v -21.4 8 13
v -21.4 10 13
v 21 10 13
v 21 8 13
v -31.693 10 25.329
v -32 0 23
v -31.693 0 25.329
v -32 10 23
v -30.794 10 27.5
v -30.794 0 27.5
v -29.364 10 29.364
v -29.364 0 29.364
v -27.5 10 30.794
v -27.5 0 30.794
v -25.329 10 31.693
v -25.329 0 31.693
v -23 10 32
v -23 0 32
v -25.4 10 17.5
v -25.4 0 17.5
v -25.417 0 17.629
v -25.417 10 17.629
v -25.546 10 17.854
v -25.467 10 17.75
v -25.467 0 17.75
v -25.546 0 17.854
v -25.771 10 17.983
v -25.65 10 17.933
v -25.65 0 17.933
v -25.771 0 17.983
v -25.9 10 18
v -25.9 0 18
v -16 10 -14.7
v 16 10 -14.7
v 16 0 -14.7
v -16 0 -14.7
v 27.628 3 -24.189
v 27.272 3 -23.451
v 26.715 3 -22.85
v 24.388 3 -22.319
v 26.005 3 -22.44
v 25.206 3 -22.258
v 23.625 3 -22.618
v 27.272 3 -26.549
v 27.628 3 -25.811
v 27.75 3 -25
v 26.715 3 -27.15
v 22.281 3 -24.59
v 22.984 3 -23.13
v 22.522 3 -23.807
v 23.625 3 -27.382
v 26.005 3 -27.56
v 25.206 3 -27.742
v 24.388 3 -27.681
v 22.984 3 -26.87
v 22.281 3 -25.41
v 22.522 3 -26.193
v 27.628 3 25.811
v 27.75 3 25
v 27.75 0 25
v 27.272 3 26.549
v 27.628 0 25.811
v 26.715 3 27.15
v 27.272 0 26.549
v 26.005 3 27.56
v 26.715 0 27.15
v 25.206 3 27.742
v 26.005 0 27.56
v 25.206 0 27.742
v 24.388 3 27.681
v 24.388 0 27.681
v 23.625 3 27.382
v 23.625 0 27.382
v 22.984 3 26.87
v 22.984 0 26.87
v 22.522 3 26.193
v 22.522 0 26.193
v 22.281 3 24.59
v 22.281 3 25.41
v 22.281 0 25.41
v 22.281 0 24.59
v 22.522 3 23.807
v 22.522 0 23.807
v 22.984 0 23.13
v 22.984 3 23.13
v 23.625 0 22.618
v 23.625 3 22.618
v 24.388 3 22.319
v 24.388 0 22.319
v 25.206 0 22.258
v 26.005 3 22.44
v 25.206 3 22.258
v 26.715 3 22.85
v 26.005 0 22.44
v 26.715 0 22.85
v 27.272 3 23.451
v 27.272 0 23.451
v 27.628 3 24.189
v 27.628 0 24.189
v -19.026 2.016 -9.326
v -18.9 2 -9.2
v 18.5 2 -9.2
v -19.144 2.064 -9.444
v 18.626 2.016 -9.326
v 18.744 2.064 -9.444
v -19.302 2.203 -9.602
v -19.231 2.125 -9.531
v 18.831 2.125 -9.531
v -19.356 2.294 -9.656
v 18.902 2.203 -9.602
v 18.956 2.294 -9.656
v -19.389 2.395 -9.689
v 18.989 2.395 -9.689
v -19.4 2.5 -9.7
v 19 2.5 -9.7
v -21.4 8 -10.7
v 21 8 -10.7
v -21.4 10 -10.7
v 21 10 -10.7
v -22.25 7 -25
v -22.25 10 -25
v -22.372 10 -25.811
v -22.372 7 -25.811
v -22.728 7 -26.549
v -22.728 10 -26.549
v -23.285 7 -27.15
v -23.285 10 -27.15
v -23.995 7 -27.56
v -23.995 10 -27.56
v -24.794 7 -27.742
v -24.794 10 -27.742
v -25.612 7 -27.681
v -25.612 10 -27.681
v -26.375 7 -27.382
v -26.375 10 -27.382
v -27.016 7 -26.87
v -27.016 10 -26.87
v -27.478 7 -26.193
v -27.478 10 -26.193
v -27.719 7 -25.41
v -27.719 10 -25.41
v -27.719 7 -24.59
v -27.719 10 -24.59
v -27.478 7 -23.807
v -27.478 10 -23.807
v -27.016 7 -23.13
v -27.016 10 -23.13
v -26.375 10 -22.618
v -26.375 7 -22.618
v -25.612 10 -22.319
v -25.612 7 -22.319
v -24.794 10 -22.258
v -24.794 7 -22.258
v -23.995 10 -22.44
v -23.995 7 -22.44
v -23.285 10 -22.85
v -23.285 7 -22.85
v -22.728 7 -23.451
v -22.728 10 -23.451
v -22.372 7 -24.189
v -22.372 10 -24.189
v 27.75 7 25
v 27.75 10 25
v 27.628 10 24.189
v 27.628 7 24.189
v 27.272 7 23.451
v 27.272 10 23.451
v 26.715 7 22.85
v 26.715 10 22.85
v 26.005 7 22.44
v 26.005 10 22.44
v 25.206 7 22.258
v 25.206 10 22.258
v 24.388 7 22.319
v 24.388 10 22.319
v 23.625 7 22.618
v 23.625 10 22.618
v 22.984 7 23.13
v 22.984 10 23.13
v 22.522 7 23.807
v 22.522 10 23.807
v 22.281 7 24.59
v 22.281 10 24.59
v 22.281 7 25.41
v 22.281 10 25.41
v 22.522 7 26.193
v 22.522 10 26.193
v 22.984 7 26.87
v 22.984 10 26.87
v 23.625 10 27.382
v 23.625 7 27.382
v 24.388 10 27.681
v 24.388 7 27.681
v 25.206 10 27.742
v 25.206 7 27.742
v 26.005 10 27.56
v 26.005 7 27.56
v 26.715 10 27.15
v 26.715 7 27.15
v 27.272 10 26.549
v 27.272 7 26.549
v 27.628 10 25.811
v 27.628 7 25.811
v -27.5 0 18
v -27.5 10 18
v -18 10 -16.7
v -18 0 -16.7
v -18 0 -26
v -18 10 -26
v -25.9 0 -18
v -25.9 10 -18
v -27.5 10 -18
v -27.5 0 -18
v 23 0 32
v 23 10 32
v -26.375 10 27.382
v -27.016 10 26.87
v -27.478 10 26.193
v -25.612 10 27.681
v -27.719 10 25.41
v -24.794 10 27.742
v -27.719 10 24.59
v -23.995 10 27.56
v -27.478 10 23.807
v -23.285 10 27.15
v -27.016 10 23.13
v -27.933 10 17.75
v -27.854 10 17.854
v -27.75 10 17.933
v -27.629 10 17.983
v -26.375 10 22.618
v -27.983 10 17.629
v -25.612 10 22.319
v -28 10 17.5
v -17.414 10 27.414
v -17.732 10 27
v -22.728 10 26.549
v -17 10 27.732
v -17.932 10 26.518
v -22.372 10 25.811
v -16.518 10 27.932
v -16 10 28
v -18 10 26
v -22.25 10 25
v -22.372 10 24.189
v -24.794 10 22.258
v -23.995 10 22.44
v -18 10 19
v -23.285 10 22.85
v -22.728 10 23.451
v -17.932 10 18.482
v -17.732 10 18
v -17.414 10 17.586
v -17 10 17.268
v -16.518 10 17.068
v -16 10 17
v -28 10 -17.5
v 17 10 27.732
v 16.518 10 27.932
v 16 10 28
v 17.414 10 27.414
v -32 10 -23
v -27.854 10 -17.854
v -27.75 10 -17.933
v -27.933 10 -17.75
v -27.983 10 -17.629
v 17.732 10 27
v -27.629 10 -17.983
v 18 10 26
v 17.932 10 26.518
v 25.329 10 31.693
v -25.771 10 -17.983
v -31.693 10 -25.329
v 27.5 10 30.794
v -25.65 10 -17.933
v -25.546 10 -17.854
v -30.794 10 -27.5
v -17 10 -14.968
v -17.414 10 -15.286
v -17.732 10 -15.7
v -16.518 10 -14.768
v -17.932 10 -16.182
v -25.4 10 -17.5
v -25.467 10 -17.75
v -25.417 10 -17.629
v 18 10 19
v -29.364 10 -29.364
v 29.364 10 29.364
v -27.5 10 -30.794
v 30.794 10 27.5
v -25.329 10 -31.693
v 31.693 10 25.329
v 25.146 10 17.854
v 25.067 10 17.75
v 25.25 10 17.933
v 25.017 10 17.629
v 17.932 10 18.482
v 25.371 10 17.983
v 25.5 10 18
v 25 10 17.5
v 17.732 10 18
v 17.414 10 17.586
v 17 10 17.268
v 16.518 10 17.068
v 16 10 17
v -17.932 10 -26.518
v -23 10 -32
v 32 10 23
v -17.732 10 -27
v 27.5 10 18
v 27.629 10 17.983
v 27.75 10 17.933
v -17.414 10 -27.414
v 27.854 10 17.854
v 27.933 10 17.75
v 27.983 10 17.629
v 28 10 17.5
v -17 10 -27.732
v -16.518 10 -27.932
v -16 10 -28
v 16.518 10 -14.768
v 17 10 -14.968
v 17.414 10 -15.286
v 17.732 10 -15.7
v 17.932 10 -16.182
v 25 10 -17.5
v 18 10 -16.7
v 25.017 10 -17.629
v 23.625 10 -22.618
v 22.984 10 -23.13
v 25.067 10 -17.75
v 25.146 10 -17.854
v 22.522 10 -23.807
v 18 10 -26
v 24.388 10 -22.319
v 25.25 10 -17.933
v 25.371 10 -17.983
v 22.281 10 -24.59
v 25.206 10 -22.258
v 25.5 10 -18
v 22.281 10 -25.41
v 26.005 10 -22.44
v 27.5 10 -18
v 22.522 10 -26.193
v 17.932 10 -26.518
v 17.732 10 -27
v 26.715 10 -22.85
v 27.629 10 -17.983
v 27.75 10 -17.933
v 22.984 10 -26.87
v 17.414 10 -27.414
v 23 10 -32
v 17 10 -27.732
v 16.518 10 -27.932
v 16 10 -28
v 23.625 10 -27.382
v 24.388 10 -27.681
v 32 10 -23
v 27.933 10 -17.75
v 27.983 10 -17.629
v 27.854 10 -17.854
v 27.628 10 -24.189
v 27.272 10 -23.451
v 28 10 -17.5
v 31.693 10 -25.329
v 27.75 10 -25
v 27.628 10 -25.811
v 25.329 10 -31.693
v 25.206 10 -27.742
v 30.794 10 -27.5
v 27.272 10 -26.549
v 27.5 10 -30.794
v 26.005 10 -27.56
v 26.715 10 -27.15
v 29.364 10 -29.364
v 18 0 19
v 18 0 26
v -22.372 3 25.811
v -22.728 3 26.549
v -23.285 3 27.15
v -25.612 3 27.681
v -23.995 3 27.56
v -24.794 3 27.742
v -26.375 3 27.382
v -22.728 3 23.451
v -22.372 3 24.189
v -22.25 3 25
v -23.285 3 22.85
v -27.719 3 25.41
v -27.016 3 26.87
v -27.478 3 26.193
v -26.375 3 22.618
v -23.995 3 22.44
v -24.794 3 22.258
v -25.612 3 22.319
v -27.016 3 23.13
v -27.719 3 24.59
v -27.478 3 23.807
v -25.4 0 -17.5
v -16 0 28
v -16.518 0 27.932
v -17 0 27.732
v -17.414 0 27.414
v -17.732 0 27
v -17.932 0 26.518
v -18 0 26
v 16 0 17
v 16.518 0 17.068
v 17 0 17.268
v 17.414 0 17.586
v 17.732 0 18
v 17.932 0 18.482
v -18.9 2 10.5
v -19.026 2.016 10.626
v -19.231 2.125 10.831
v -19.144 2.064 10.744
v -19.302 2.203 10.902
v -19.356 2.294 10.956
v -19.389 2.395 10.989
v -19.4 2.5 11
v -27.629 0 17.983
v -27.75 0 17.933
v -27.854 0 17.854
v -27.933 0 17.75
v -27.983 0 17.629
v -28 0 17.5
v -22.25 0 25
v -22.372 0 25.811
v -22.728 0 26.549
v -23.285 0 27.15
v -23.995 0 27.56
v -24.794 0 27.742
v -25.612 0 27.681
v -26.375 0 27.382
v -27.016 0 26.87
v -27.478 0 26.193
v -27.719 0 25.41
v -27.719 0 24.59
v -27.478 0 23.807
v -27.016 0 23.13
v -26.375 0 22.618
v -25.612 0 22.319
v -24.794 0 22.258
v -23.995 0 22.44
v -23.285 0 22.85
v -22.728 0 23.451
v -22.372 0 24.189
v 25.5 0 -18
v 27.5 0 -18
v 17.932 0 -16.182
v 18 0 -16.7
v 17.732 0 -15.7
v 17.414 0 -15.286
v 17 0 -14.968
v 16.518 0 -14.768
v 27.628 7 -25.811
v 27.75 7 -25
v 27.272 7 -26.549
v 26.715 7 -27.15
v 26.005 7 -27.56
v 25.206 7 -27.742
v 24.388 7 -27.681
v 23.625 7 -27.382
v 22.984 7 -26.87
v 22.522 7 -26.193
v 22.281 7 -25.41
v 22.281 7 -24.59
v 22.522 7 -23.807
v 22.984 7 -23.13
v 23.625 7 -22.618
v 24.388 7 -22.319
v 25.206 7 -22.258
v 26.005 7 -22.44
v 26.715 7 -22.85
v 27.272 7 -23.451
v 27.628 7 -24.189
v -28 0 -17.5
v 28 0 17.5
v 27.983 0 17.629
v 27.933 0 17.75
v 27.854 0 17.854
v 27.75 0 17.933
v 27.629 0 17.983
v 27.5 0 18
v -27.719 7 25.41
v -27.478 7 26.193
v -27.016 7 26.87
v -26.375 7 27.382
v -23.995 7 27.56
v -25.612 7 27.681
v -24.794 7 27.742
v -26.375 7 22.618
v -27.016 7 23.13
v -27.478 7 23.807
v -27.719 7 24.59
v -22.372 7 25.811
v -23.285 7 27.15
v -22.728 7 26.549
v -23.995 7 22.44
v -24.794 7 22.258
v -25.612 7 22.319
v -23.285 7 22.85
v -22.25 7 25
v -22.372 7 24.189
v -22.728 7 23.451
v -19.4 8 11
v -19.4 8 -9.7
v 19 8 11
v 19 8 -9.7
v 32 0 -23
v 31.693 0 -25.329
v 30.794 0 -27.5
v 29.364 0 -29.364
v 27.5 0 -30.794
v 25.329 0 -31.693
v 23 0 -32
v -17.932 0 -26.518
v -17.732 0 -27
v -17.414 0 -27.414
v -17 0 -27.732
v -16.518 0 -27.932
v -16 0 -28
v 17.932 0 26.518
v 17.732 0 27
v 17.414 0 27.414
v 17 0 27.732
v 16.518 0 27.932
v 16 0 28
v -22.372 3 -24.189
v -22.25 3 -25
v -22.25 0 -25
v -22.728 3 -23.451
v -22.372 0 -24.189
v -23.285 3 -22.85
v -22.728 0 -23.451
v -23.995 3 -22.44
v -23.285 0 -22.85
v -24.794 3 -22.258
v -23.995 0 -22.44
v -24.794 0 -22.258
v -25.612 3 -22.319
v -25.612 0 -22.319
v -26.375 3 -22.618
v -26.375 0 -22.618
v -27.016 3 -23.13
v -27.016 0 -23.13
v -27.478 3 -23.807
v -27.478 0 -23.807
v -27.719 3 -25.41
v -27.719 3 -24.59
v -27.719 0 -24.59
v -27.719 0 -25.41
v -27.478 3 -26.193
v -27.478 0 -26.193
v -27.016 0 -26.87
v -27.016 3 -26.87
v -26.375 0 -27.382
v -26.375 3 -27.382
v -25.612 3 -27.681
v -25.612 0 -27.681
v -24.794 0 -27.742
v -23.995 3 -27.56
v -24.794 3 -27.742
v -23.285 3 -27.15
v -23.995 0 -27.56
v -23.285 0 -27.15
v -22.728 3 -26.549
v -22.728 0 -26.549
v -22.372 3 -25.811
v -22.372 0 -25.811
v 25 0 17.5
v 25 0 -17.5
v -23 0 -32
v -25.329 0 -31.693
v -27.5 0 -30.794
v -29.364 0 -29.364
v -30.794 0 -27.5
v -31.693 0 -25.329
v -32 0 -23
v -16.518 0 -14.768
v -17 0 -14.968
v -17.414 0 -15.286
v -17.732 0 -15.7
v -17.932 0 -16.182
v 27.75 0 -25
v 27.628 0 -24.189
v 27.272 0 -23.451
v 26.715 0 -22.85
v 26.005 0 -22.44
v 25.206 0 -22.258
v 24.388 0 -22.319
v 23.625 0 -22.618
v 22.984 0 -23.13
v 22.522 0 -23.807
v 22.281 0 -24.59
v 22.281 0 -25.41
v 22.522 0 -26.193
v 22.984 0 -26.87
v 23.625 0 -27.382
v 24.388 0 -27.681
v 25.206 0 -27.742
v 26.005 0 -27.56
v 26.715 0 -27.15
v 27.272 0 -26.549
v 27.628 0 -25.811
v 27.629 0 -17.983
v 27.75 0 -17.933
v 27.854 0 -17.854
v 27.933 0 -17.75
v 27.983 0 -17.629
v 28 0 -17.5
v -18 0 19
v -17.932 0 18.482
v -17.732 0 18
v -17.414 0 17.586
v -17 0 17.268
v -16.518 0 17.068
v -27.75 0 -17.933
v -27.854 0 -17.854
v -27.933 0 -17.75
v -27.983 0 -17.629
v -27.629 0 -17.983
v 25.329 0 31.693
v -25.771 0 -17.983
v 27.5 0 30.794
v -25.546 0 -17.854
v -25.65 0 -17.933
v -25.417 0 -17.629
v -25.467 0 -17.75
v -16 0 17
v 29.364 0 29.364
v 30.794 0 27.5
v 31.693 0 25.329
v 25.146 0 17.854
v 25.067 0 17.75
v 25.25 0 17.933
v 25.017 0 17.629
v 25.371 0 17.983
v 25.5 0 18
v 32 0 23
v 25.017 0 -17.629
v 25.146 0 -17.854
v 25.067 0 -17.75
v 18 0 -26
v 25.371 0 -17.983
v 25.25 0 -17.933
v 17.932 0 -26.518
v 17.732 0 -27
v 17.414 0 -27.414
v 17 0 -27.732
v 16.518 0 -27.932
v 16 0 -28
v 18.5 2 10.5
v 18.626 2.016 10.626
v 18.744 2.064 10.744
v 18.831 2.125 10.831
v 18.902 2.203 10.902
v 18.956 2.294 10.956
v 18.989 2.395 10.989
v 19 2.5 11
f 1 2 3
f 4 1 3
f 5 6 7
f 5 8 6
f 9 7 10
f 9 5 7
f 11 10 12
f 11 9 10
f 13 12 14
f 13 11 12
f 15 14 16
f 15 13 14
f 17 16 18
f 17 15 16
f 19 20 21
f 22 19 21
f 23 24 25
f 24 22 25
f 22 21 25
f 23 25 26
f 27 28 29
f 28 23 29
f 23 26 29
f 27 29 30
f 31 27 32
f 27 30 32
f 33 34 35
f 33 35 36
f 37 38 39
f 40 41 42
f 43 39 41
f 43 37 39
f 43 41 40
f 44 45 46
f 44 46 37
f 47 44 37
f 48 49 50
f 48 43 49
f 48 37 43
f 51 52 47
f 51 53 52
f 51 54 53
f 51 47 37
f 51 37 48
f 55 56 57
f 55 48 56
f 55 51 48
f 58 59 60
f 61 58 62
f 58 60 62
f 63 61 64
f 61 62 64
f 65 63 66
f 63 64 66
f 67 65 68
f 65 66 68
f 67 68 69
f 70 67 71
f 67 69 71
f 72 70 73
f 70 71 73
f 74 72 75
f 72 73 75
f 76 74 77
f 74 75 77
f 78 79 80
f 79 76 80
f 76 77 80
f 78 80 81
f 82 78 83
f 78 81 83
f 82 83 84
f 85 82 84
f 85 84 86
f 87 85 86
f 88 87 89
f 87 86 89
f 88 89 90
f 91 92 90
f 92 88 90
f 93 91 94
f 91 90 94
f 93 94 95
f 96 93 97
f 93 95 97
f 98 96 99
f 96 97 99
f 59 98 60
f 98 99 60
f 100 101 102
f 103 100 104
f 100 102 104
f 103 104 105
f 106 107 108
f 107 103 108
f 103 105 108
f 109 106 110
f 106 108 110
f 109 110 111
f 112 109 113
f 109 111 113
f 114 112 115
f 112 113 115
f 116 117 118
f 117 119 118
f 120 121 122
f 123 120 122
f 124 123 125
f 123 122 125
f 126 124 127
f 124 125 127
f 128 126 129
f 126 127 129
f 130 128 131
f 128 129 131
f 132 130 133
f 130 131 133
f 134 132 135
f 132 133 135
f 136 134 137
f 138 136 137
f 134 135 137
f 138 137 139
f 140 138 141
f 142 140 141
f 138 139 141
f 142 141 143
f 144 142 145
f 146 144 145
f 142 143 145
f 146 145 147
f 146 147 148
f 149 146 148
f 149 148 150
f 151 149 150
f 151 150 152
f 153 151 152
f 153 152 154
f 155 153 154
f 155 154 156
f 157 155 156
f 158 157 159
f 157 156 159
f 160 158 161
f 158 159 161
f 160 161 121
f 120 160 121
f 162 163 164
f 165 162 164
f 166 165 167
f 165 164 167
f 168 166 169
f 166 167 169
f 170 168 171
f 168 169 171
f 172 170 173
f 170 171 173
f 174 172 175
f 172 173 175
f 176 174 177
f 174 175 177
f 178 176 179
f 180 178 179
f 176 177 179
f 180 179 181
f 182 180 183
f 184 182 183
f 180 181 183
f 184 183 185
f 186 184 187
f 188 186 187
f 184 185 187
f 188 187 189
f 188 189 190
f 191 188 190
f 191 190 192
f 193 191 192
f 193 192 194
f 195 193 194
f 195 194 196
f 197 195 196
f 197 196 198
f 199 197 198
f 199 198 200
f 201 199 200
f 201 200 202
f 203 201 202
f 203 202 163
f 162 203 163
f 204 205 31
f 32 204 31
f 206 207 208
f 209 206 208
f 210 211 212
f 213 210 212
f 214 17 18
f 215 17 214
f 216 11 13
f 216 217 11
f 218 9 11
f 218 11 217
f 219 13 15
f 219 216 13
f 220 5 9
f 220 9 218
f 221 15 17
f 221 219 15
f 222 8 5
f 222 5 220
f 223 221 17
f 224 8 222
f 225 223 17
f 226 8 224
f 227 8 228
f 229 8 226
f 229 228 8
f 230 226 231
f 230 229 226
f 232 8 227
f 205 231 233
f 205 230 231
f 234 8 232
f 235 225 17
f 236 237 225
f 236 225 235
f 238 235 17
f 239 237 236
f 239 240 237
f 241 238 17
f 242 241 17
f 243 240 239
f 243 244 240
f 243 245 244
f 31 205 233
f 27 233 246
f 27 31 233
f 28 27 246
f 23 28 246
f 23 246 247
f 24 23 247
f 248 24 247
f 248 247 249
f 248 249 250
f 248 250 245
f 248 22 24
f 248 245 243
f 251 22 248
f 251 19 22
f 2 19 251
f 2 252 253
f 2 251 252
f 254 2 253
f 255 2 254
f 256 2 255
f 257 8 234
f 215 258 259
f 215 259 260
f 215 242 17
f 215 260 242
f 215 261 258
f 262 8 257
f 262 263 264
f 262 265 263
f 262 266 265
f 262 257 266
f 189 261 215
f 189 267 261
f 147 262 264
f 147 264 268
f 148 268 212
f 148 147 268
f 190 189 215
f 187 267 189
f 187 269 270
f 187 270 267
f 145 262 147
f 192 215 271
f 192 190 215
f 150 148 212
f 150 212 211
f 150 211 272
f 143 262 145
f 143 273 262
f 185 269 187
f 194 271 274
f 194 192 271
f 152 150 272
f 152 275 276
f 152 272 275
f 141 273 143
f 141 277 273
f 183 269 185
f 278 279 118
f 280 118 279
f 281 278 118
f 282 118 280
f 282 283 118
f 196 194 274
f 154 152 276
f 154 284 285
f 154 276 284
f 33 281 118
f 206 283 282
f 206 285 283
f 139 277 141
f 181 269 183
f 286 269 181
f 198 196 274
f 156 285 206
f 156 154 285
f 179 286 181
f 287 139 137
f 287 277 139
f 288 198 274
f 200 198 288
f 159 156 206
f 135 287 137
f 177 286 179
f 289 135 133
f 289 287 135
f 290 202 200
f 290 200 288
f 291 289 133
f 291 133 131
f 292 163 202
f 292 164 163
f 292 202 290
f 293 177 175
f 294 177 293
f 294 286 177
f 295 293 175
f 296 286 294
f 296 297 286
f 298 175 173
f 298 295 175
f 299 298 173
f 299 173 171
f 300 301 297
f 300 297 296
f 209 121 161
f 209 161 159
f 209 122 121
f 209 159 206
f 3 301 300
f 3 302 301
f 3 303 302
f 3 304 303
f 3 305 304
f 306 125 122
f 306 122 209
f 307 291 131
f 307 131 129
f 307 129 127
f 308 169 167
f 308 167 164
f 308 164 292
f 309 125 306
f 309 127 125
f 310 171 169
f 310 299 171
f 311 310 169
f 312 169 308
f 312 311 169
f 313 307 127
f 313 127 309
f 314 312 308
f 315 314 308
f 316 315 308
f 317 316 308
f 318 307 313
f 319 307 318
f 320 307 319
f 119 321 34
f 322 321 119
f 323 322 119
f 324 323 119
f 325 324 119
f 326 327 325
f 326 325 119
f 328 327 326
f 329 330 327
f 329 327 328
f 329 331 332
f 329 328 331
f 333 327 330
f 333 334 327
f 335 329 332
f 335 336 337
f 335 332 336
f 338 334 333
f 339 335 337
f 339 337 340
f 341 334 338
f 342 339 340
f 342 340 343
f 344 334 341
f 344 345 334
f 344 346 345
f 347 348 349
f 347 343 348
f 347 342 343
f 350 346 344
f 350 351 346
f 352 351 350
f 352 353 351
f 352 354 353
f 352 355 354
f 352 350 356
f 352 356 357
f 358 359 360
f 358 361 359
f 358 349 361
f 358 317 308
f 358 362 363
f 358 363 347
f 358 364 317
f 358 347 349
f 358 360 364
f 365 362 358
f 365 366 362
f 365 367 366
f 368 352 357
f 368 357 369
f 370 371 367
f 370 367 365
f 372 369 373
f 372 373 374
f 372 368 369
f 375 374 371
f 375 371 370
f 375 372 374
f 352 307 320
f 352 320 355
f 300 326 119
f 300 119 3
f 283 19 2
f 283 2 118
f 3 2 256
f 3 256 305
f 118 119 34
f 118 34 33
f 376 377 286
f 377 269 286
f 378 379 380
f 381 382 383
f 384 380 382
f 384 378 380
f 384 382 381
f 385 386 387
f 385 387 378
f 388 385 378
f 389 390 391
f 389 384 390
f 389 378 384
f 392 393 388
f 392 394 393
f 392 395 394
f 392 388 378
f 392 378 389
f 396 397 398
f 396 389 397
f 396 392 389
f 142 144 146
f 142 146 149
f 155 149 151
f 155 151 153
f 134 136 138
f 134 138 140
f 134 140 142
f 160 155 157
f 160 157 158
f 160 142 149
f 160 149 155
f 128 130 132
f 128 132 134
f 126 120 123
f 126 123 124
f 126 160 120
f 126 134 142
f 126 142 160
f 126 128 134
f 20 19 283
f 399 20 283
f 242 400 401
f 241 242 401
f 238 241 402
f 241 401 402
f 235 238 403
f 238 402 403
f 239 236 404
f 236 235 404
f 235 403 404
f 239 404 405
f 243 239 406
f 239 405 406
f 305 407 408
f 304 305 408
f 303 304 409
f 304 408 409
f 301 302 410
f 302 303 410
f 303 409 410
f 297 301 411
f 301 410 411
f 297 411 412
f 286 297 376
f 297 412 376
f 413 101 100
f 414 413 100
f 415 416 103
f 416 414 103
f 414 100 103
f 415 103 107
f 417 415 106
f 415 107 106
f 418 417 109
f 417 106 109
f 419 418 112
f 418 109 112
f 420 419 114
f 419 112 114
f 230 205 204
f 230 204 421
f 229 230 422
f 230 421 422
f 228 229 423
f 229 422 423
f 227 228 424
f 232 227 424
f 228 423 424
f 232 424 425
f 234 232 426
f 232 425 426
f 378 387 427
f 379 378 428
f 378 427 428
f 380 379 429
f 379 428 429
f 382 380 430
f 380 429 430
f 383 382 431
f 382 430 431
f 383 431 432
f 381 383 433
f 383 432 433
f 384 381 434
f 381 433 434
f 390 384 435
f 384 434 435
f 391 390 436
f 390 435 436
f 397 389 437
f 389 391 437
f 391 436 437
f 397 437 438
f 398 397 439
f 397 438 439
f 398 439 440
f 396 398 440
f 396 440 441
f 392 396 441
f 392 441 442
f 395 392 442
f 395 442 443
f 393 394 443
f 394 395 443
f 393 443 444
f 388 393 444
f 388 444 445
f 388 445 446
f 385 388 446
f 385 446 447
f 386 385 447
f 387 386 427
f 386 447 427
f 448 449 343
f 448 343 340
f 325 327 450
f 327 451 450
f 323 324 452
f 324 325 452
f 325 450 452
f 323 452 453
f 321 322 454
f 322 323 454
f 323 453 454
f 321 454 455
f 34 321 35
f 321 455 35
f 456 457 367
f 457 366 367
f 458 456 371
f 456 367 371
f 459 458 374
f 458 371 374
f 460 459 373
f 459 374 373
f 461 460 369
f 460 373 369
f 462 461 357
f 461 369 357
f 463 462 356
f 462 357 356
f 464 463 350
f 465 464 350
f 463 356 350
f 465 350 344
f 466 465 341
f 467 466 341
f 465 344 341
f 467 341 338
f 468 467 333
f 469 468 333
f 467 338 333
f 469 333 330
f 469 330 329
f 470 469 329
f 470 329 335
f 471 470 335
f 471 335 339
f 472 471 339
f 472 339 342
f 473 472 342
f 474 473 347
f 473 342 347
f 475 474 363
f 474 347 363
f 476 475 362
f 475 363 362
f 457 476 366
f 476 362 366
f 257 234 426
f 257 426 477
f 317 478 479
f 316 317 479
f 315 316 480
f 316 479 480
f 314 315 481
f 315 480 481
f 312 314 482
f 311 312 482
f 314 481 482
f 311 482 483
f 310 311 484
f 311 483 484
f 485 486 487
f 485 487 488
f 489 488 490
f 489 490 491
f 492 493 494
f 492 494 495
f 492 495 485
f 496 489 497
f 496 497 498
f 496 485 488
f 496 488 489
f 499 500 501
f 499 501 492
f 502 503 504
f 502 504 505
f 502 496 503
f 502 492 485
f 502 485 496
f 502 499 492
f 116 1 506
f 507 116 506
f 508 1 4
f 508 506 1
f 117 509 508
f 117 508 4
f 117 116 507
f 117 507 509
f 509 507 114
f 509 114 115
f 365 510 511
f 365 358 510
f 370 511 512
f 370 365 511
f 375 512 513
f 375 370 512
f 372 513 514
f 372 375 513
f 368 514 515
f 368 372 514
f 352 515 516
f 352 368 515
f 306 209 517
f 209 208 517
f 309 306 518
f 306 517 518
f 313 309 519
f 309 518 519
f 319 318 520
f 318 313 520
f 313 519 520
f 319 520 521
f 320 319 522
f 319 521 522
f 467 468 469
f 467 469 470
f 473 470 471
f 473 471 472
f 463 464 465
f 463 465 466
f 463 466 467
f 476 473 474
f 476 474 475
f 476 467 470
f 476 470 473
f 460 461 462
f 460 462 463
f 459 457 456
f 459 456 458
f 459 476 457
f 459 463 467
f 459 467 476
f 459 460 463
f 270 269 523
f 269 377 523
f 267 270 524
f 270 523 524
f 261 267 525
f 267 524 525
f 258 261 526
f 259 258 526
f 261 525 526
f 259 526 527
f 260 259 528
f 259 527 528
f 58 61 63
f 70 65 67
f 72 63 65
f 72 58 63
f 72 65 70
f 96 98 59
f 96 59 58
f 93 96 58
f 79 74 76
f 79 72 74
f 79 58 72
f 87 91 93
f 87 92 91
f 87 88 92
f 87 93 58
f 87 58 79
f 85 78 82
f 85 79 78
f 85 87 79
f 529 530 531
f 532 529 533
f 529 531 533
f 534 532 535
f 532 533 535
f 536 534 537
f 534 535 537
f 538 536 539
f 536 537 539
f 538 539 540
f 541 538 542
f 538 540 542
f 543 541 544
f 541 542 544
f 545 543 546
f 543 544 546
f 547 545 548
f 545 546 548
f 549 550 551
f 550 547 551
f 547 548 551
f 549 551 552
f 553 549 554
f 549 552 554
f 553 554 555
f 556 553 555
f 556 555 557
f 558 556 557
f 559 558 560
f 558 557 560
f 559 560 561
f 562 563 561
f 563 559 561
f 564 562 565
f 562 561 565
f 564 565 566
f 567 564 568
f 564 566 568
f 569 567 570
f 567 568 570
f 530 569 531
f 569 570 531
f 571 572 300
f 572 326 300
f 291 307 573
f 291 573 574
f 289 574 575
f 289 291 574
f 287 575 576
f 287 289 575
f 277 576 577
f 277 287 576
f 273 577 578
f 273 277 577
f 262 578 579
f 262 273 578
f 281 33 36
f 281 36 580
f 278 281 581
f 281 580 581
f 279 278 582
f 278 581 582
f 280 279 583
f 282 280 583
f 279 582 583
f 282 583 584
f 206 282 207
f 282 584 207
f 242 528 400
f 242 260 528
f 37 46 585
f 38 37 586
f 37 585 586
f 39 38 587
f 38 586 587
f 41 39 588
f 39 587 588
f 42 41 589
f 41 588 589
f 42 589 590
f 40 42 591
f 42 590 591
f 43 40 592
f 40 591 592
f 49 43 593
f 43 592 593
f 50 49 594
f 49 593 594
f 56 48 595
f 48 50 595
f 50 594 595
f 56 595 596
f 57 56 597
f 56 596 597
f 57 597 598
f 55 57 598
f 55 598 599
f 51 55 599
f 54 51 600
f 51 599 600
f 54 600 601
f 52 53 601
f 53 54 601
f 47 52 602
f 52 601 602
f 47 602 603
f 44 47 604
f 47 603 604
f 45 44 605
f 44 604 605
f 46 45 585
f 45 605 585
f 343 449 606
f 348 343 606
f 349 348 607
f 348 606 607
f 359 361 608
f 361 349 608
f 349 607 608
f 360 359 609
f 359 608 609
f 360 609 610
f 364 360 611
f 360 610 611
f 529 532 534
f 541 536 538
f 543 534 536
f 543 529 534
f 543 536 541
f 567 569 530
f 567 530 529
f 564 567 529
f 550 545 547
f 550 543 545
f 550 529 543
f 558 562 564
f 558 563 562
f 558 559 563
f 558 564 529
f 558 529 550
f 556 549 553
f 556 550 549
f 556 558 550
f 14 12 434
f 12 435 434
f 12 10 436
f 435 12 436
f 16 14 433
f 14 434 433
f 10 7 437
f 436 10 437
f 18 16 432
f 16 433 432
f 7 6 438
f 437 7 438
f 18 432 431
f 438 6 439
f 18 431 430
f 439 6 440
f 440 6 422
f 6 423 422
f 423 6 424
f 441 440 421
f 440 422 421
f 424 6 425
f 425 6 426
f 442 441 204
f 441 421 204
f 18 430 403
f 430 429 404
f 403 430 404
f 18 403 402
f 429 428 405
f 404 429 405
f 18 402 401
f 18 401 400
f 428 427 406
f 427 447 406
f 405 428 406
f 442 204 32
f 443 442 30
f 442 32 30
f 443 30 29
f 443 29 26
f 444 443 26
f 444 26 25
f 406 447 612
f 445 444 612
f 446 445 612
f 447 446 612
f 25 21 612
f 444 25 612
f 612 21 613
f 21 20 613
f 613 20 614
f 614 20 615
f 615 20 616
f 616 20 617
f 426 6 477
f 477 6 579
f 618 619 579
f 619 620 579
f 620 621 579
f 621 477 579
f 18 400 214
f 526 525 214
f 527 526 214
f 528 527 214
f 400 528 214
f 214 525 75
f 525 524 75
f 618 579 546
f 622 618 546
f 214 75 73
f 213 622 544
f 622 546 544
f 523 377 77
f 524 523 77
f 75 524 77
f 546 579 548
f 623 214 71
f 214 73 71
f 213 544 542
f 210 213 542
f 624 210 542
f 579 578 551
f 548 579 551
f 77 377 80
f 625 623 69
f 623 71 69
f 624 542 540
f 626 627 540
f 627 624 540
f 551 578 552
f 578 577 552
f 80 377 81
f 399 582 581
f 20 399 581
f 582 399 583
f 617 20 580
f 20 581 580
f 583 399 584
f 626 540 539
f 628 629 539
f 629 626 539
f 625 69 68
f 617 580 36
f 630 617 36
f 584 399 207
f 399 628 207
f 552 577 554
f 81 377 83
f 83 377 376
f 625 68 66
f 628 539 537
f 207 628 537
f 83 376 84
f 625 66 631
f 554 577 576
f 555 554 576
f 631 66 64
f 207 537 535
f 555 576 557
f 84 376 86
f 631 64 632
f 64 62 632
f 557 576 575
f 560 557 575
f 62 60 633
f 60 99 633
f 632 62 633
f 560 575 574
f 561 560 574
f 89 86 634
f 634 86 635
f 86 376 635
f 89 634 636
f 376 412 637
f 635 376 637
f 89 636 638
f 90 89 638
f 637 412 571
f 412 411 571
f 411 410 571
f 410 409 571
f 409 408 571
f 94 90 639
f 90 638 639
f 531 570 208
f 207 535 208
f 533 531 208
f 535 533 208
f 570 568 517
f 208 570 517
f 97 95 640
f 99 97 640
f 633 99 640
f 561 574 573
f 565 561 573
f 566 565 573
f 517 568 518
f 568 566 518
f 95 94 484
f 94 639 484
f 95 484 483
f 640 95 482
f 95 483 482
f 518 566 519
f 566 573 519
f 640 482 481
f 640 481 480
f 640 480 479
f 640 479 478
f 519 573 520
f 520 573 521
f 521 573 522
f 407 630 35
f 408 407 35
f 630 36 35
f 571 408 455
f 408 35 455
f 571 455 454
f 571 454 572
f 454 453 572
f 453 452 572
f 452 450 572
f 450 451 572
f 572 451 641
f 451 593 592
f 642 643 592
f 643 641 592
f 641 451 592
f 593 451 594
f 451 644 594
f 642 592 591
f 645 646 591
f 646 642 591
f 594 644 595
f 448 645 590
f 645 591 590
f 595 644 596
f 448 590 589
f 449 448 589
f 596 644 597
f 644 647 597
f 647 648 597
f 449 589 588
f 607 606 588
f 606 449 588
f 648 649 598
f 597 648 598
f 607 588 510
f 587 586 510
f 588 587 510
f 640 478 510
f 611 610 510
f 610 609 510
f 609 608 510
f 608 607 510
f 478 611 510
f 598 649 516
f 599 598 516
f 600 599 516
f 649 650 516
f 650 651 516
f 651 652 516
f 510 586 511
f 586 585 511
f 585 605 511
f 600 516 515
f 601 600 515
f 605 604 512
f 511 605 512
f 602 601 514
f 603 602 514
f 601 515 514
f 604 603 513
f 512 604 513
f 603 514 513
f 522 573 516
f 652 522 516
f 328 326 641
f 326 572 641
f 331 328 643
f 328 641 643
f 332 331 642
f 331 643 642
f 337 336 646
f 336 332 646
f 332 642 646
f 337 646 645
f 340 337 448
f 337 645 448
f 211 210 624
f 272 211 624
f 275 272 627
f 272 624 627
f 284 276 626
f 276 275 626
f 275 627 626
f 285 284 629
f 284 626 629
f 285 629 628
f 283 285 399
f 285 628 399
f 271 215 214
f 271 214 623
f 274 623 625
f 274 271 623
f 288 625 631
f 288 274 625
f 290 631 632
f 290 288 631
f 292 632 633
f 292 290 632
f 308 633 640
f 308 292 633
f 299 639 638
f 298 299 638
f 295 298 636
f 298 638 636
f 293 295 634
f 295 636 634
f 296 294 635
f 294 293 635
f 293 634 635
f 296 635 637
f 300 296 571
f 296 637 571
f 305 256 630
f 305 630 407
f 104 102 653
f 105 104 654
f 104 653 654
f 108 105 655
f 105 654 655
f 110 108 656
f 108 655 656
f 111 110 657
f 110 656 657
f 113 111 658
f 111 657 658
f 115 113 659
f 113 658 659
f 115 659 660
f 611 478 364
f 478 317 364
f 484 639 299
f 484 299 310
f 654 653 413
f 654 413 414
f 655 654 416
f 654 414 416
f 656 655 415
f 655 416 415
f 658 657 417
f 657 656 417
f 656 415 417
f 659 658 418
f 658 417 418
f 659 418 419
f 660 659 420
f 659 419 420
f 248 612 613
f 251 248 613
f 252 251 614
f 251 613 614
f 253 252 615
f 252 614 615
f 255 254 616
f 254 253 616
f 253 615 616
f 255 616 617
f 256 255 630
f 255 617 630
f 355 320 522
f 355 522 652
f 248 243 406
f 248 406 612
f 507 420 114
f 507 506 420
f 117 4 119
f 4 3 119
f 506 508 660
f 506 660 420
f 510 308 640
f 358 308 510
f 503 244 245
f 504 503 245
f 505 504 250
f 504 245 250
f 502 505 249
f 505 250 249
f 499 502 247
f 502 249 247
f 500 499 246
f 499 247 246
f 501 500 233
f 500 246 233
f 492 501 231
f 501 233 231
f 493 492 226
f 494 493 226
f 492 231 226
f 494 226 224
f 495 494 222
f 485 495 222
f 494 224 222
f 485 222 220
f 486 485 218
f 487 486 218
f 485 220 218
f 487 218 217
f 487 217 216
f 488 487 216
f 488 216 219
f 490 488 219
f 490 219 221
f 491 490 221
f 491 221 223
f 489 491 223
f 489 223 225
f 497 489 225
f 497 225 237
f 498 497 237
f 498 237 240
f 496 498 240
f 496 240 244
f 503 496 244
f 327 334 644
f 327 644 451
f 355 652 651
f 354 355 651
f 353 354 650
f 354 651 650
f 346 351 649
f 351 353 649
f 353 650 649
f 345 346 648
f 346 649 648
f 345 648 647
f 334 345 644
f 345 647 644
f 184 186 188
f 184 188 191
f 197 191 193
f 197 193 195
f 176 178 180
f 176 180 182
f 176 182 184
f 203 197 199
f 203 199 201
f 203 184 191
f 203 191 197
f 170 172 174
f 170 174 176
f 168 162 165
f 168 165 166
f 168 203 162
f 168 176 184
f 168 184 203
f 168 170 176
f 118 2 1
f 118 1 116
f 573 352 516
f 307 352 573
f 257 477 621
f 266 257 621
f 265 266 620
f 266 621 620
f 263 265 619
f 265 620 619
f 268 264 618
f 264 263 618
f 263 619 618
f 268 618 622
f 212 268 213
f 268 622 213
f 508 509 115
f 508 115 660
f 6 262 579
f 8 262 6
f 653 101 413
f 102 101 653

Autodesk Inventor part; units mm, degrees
ref_plane "YZ Plane" through (0, 0, 0) normal (1, 0, 0) x (0, 1, 0)
ref_plane "XZ Plane" through (0, 0, 0) normal (0, 1, 0) x (-1, 0, 0)
sketch "Sketch1" plane through (0, 0, 0) normal (0, 1, 0) x (-1, 0, 0)
  line L0 (30, 30) -> (-30, 30)
  line L1 (-30, 30) -> (-30, -30)
  line L2 (-30, -30) -> (30, -30)
  line L3 (30, -30) -> (30, 30)
  line L4 (30, 30) -> (-30, -30) construction
  line L5 (-30, 30) -> (30, -30) construction
  point P0 (0, 0)
  dimension "d0" = 60
  dimension "d1" = 60
extrude "Extrusion1" add sketch "Sketch1" along normal blind 10
fillet "Fillet1" radius 7 4 edges at (30, 5, 30) (30, 5, -30) (-30, 5, 30) (-30, 5, -30)
sketch "Sketch2" plane through (0, 10, 0) normal (0, 1, 0) x (1, 0, 0)
  line L0 (-30, 30) -> (30, 30)
  line L1 (30, 30) -> (30, -30)
  line L2 (30, -30) -> (-30, -30)
  line L3 (-30, -30) -> (-30, 30)
  line L4 (-30, 30) -> (30, -30) construction
  line L5 (30, 30) -> (-30, -30) construction
  line L6 (25, -25) -> (25, 25)
  line L7 (25, 25) -> (-25, 25)
  line L8 (-25, 25) -> (-25, -25)
  line L9 (-25, -25) -> (25, -25)
  circle A0 centre (25, -25) radius 2.75
  circle A1 centre (-25, -25) radius 2.75
  circle A2 centre (25, 25) radius 2.75
  circle A3 centre (-25, 25) radius 2.75
  point P0 (0, 0)
  dimension "d5" = 5
  dimension "d6" = 5.5
  dimension "d7" = 5.5
  dimension "d8" = 5.5
  dimension "d9" = 5.5
extrude "Extrusion2" cut sketch "Sketch2" against normal blind 3 contours L9 A0 L6 | L6 A0 L9 | A2 L7 L6 | L6 L7 A2 | A1 L8 L9 | L9 L8 A1 | A3 L8 L7 | L7 L8 A3
sketch "Sketch7" plane through (0, 10, 0) normal (0, 1, 0) x (1, 0, 0)
  line L0 (-23, 30) -> (23, 30)
  line L1 (30, 23) -> (30, -23)
  line L2 (23, -30) -> (-23, -30)
  line L3 (-30, -23) -> (-30, 23)
  line L4 (-30, 30) -> (30, -30) construction
  line L5 (30, 30) -> (-30, -30) construction
  arc A0 (-23, 30) -> (-30, 23) centre (-23, 23) ccw
  arc A1 (-30, -23) -> (-23, -30) centre (-23, -23) ccw
  arc A2 (23, -30) -> (30, -23) centre (23, -23) ccw
  arc A3 (30, 23) -> (23, 30) centre (23, 23) ccw
  line L6 (23, 32) -> (-23, 32)
  arc A4 (-23, 32) -> (-32, 23) centre (-23, 23) ccw
  line L7 (-32, 23) -> (-32, -23)
  arc A5 (-32, -23) -> (-23, -32) centre (-23, -23) ccw
  line L8 (-23, -32) -> (23, -32)
  arc A6 (23, -32) -> (32, -23) centre (23, -23) ccw
  line L9 (32, -23) -> (32, 23)
  arc A7 (32, 23) -> (23, 32) centre (23, 23) ccw
  point P0 (0, 0)
  dimension "d47" = 7
  dimension "d48" = 2
extrude "Extrusion6" add sketch "Sketch7" against normal blind 10
sketch "Sketch17" plane through (0, 10, 0) normal (0, 1, 0) x (1, 0, 0)
  circle A0 centre (25, -25) radius 2.75 projected
  line L0 (-25, 25) -> (25, 25)
  line L1 (25, 25) -> (25, -25)
  line L2 (25, -25) -> (-25, -25)
  line L3 (-25, -25) -> (-25, 25)
  line L4 (-25, 25) -> (25, -25) construction
  line L5 (25, 25) -> (-25, -25) construction
  line L6 (21, -21) -> (21, 10.7)
  line L7 (-21.4, -13) -> (21, -13)
  line L8 (21, 10.7) -> (-21.4, 10.7)
  line L9 (-21.4, -13) -> (-21.4, 10.7)
  line L10 (-19.4, 9.7) -> (-19.4, -11)
  line L11 (-19.4, -11) -> (19, -11)
  line L12 (19, 9.7) -> (-19.4, 9.7)
  line L13 (19, 9.7) -> (19, -11)
  point P0 (0, 0)
  dimension "d134" = 50
  dimension "d135" = 50
  dimension "d136" = 4
  dimension "d137" = 8
  dimension "d138" = 42.4
  dimension "d139" = 23.7
  dimension "d141" = 1
  dimension "d142" = 2
extrude "Extrusion15" cut sketch "Sketch17" against normal blind 2 contours L7 L9 L8 L6
sketch "Sketch18" plane through (0, 10, 0) normal (0, 1, 0) x (1, 0, 0)
  line L0 (-19.4, 9.7) -> (19, 9.7)
  line L1 (19, 9.7) -> (19, -11)
  line L2 (19, -11) -> (-19.4, -11)
  line L3 (-19.4, -11) -> (-19.4, 9.7)
  point P0 (0, 0)
extrude "Extrusion16" cut sketch "Sketch18" against normal blind 8
sketch "Sketch19" plane through (0, 10, 0) normal (0, 1, 0) x (1, 0, 0)
  line L0 (23, 32) -> (-23, 32) projected
  line L1 (-32, 23) -> (-32, -23) projected
  line L2 (32, -23) -> (32, 23) projected
  line L3 (-21.4, 10.7) -> (21, 10.7) projected
  line L4 (-18, 14.7) -> (-18, 28)
  line L5 (-18, 28) -> (18, 28)
  line L6 (18, 28) -> (18, 14.7)
  line L7 (18, 14.7) -> (-18, 14.7)
  line L8 (-23, -32) -> (23, -32) projected
  line L9 (-28, -18) -> (-28, 18)
  line L10 (-21.4, -13) -> (-21.4, 10.7) projected
  line L11 (-28, -18) -> (-25.4, -18)
  line L12 (-25.4, -18) -> (-25.4, 18)
  line L13 (-25.4, 18) -> (-28, 18)
  line L14 (21, 10.7) -> (21, -13) projected
  line L15 (28, 18) -> (25, 18)
  line L16 (25, 18) -> (25, -18)
  line L17 (25, -18) -> (28, -18)
  line L18 (28, -18) -> (28, 18)
  line L19 (21, -13) -> (-21.4, -13) projected
  line L20 (18, -28) -> (18, -17)
  line L21 (18, -28) -> (-18, -28)
  line L22 (-18, -28) -> (-18, -17)
  line L23 (-18, -17) -> (18, -17)
  point P0 (0, 0)
  dimension "d147" = 4
  dimension "d148" = 14
  dimension "d149" = 4
  dimension "d150" = 14
  dimension "d151" = 4
  dimension "d152" = 4
  dimension "d153" = 4
  dimension "d154" = 4
  dimension "d155" = 14
  dimension "d156" = 14
  dimension "d157" = 4
  dimension "d158" = 4
  dimension "d159" = 14
  dimension "d160" = 4
  dimension "d161" = 14
  dimension "d162" = 4
  dimension "d163" = 4
  dimension "d164" = 4
  dimension "d165" = 14
  dimension "d166" = 14
  dimension "d167" = 4
extrude "Extrusion17" cut sketch "Sketch19" against normal through all contours L4 L5 L6 L7 | L9 L13 L12 L11 | L18 L17 L16 L15 | L21 L22 L23 L20
fillet "Fillet5" radius 2 8 edges at (18, 5, -28) (18, 5, 17) (-18, 5, -28) (-18, 5, 17) (-18, 5, -14.7) (-18, 5, 28) (18, 5, -14.7) (18, 5, 28)
fillet "Fillet5" radius 0.5 12 edges at (28, 5, 18) (-25.4, 5, 18) (28, 5, -18) (-25.4, 5, -18) (-28, 5, -18) (25, 5, -18) (-0.2, 2, -9.7) (-19.4, 2, 0.65) (-0.2, 2, 11) (-28, 5, 18) (25, 5, 18) (19, 2, 0.65)
ref_plane "Work Plane4" through (0, 5, 0) normal (0, 1, 0) x (1, 0, 0)
mirror "Mirror4" about plane through (0, 5, 0) normal (0, 1, 0) of "Extrusion2"
properties part number "14 pin long holder"
